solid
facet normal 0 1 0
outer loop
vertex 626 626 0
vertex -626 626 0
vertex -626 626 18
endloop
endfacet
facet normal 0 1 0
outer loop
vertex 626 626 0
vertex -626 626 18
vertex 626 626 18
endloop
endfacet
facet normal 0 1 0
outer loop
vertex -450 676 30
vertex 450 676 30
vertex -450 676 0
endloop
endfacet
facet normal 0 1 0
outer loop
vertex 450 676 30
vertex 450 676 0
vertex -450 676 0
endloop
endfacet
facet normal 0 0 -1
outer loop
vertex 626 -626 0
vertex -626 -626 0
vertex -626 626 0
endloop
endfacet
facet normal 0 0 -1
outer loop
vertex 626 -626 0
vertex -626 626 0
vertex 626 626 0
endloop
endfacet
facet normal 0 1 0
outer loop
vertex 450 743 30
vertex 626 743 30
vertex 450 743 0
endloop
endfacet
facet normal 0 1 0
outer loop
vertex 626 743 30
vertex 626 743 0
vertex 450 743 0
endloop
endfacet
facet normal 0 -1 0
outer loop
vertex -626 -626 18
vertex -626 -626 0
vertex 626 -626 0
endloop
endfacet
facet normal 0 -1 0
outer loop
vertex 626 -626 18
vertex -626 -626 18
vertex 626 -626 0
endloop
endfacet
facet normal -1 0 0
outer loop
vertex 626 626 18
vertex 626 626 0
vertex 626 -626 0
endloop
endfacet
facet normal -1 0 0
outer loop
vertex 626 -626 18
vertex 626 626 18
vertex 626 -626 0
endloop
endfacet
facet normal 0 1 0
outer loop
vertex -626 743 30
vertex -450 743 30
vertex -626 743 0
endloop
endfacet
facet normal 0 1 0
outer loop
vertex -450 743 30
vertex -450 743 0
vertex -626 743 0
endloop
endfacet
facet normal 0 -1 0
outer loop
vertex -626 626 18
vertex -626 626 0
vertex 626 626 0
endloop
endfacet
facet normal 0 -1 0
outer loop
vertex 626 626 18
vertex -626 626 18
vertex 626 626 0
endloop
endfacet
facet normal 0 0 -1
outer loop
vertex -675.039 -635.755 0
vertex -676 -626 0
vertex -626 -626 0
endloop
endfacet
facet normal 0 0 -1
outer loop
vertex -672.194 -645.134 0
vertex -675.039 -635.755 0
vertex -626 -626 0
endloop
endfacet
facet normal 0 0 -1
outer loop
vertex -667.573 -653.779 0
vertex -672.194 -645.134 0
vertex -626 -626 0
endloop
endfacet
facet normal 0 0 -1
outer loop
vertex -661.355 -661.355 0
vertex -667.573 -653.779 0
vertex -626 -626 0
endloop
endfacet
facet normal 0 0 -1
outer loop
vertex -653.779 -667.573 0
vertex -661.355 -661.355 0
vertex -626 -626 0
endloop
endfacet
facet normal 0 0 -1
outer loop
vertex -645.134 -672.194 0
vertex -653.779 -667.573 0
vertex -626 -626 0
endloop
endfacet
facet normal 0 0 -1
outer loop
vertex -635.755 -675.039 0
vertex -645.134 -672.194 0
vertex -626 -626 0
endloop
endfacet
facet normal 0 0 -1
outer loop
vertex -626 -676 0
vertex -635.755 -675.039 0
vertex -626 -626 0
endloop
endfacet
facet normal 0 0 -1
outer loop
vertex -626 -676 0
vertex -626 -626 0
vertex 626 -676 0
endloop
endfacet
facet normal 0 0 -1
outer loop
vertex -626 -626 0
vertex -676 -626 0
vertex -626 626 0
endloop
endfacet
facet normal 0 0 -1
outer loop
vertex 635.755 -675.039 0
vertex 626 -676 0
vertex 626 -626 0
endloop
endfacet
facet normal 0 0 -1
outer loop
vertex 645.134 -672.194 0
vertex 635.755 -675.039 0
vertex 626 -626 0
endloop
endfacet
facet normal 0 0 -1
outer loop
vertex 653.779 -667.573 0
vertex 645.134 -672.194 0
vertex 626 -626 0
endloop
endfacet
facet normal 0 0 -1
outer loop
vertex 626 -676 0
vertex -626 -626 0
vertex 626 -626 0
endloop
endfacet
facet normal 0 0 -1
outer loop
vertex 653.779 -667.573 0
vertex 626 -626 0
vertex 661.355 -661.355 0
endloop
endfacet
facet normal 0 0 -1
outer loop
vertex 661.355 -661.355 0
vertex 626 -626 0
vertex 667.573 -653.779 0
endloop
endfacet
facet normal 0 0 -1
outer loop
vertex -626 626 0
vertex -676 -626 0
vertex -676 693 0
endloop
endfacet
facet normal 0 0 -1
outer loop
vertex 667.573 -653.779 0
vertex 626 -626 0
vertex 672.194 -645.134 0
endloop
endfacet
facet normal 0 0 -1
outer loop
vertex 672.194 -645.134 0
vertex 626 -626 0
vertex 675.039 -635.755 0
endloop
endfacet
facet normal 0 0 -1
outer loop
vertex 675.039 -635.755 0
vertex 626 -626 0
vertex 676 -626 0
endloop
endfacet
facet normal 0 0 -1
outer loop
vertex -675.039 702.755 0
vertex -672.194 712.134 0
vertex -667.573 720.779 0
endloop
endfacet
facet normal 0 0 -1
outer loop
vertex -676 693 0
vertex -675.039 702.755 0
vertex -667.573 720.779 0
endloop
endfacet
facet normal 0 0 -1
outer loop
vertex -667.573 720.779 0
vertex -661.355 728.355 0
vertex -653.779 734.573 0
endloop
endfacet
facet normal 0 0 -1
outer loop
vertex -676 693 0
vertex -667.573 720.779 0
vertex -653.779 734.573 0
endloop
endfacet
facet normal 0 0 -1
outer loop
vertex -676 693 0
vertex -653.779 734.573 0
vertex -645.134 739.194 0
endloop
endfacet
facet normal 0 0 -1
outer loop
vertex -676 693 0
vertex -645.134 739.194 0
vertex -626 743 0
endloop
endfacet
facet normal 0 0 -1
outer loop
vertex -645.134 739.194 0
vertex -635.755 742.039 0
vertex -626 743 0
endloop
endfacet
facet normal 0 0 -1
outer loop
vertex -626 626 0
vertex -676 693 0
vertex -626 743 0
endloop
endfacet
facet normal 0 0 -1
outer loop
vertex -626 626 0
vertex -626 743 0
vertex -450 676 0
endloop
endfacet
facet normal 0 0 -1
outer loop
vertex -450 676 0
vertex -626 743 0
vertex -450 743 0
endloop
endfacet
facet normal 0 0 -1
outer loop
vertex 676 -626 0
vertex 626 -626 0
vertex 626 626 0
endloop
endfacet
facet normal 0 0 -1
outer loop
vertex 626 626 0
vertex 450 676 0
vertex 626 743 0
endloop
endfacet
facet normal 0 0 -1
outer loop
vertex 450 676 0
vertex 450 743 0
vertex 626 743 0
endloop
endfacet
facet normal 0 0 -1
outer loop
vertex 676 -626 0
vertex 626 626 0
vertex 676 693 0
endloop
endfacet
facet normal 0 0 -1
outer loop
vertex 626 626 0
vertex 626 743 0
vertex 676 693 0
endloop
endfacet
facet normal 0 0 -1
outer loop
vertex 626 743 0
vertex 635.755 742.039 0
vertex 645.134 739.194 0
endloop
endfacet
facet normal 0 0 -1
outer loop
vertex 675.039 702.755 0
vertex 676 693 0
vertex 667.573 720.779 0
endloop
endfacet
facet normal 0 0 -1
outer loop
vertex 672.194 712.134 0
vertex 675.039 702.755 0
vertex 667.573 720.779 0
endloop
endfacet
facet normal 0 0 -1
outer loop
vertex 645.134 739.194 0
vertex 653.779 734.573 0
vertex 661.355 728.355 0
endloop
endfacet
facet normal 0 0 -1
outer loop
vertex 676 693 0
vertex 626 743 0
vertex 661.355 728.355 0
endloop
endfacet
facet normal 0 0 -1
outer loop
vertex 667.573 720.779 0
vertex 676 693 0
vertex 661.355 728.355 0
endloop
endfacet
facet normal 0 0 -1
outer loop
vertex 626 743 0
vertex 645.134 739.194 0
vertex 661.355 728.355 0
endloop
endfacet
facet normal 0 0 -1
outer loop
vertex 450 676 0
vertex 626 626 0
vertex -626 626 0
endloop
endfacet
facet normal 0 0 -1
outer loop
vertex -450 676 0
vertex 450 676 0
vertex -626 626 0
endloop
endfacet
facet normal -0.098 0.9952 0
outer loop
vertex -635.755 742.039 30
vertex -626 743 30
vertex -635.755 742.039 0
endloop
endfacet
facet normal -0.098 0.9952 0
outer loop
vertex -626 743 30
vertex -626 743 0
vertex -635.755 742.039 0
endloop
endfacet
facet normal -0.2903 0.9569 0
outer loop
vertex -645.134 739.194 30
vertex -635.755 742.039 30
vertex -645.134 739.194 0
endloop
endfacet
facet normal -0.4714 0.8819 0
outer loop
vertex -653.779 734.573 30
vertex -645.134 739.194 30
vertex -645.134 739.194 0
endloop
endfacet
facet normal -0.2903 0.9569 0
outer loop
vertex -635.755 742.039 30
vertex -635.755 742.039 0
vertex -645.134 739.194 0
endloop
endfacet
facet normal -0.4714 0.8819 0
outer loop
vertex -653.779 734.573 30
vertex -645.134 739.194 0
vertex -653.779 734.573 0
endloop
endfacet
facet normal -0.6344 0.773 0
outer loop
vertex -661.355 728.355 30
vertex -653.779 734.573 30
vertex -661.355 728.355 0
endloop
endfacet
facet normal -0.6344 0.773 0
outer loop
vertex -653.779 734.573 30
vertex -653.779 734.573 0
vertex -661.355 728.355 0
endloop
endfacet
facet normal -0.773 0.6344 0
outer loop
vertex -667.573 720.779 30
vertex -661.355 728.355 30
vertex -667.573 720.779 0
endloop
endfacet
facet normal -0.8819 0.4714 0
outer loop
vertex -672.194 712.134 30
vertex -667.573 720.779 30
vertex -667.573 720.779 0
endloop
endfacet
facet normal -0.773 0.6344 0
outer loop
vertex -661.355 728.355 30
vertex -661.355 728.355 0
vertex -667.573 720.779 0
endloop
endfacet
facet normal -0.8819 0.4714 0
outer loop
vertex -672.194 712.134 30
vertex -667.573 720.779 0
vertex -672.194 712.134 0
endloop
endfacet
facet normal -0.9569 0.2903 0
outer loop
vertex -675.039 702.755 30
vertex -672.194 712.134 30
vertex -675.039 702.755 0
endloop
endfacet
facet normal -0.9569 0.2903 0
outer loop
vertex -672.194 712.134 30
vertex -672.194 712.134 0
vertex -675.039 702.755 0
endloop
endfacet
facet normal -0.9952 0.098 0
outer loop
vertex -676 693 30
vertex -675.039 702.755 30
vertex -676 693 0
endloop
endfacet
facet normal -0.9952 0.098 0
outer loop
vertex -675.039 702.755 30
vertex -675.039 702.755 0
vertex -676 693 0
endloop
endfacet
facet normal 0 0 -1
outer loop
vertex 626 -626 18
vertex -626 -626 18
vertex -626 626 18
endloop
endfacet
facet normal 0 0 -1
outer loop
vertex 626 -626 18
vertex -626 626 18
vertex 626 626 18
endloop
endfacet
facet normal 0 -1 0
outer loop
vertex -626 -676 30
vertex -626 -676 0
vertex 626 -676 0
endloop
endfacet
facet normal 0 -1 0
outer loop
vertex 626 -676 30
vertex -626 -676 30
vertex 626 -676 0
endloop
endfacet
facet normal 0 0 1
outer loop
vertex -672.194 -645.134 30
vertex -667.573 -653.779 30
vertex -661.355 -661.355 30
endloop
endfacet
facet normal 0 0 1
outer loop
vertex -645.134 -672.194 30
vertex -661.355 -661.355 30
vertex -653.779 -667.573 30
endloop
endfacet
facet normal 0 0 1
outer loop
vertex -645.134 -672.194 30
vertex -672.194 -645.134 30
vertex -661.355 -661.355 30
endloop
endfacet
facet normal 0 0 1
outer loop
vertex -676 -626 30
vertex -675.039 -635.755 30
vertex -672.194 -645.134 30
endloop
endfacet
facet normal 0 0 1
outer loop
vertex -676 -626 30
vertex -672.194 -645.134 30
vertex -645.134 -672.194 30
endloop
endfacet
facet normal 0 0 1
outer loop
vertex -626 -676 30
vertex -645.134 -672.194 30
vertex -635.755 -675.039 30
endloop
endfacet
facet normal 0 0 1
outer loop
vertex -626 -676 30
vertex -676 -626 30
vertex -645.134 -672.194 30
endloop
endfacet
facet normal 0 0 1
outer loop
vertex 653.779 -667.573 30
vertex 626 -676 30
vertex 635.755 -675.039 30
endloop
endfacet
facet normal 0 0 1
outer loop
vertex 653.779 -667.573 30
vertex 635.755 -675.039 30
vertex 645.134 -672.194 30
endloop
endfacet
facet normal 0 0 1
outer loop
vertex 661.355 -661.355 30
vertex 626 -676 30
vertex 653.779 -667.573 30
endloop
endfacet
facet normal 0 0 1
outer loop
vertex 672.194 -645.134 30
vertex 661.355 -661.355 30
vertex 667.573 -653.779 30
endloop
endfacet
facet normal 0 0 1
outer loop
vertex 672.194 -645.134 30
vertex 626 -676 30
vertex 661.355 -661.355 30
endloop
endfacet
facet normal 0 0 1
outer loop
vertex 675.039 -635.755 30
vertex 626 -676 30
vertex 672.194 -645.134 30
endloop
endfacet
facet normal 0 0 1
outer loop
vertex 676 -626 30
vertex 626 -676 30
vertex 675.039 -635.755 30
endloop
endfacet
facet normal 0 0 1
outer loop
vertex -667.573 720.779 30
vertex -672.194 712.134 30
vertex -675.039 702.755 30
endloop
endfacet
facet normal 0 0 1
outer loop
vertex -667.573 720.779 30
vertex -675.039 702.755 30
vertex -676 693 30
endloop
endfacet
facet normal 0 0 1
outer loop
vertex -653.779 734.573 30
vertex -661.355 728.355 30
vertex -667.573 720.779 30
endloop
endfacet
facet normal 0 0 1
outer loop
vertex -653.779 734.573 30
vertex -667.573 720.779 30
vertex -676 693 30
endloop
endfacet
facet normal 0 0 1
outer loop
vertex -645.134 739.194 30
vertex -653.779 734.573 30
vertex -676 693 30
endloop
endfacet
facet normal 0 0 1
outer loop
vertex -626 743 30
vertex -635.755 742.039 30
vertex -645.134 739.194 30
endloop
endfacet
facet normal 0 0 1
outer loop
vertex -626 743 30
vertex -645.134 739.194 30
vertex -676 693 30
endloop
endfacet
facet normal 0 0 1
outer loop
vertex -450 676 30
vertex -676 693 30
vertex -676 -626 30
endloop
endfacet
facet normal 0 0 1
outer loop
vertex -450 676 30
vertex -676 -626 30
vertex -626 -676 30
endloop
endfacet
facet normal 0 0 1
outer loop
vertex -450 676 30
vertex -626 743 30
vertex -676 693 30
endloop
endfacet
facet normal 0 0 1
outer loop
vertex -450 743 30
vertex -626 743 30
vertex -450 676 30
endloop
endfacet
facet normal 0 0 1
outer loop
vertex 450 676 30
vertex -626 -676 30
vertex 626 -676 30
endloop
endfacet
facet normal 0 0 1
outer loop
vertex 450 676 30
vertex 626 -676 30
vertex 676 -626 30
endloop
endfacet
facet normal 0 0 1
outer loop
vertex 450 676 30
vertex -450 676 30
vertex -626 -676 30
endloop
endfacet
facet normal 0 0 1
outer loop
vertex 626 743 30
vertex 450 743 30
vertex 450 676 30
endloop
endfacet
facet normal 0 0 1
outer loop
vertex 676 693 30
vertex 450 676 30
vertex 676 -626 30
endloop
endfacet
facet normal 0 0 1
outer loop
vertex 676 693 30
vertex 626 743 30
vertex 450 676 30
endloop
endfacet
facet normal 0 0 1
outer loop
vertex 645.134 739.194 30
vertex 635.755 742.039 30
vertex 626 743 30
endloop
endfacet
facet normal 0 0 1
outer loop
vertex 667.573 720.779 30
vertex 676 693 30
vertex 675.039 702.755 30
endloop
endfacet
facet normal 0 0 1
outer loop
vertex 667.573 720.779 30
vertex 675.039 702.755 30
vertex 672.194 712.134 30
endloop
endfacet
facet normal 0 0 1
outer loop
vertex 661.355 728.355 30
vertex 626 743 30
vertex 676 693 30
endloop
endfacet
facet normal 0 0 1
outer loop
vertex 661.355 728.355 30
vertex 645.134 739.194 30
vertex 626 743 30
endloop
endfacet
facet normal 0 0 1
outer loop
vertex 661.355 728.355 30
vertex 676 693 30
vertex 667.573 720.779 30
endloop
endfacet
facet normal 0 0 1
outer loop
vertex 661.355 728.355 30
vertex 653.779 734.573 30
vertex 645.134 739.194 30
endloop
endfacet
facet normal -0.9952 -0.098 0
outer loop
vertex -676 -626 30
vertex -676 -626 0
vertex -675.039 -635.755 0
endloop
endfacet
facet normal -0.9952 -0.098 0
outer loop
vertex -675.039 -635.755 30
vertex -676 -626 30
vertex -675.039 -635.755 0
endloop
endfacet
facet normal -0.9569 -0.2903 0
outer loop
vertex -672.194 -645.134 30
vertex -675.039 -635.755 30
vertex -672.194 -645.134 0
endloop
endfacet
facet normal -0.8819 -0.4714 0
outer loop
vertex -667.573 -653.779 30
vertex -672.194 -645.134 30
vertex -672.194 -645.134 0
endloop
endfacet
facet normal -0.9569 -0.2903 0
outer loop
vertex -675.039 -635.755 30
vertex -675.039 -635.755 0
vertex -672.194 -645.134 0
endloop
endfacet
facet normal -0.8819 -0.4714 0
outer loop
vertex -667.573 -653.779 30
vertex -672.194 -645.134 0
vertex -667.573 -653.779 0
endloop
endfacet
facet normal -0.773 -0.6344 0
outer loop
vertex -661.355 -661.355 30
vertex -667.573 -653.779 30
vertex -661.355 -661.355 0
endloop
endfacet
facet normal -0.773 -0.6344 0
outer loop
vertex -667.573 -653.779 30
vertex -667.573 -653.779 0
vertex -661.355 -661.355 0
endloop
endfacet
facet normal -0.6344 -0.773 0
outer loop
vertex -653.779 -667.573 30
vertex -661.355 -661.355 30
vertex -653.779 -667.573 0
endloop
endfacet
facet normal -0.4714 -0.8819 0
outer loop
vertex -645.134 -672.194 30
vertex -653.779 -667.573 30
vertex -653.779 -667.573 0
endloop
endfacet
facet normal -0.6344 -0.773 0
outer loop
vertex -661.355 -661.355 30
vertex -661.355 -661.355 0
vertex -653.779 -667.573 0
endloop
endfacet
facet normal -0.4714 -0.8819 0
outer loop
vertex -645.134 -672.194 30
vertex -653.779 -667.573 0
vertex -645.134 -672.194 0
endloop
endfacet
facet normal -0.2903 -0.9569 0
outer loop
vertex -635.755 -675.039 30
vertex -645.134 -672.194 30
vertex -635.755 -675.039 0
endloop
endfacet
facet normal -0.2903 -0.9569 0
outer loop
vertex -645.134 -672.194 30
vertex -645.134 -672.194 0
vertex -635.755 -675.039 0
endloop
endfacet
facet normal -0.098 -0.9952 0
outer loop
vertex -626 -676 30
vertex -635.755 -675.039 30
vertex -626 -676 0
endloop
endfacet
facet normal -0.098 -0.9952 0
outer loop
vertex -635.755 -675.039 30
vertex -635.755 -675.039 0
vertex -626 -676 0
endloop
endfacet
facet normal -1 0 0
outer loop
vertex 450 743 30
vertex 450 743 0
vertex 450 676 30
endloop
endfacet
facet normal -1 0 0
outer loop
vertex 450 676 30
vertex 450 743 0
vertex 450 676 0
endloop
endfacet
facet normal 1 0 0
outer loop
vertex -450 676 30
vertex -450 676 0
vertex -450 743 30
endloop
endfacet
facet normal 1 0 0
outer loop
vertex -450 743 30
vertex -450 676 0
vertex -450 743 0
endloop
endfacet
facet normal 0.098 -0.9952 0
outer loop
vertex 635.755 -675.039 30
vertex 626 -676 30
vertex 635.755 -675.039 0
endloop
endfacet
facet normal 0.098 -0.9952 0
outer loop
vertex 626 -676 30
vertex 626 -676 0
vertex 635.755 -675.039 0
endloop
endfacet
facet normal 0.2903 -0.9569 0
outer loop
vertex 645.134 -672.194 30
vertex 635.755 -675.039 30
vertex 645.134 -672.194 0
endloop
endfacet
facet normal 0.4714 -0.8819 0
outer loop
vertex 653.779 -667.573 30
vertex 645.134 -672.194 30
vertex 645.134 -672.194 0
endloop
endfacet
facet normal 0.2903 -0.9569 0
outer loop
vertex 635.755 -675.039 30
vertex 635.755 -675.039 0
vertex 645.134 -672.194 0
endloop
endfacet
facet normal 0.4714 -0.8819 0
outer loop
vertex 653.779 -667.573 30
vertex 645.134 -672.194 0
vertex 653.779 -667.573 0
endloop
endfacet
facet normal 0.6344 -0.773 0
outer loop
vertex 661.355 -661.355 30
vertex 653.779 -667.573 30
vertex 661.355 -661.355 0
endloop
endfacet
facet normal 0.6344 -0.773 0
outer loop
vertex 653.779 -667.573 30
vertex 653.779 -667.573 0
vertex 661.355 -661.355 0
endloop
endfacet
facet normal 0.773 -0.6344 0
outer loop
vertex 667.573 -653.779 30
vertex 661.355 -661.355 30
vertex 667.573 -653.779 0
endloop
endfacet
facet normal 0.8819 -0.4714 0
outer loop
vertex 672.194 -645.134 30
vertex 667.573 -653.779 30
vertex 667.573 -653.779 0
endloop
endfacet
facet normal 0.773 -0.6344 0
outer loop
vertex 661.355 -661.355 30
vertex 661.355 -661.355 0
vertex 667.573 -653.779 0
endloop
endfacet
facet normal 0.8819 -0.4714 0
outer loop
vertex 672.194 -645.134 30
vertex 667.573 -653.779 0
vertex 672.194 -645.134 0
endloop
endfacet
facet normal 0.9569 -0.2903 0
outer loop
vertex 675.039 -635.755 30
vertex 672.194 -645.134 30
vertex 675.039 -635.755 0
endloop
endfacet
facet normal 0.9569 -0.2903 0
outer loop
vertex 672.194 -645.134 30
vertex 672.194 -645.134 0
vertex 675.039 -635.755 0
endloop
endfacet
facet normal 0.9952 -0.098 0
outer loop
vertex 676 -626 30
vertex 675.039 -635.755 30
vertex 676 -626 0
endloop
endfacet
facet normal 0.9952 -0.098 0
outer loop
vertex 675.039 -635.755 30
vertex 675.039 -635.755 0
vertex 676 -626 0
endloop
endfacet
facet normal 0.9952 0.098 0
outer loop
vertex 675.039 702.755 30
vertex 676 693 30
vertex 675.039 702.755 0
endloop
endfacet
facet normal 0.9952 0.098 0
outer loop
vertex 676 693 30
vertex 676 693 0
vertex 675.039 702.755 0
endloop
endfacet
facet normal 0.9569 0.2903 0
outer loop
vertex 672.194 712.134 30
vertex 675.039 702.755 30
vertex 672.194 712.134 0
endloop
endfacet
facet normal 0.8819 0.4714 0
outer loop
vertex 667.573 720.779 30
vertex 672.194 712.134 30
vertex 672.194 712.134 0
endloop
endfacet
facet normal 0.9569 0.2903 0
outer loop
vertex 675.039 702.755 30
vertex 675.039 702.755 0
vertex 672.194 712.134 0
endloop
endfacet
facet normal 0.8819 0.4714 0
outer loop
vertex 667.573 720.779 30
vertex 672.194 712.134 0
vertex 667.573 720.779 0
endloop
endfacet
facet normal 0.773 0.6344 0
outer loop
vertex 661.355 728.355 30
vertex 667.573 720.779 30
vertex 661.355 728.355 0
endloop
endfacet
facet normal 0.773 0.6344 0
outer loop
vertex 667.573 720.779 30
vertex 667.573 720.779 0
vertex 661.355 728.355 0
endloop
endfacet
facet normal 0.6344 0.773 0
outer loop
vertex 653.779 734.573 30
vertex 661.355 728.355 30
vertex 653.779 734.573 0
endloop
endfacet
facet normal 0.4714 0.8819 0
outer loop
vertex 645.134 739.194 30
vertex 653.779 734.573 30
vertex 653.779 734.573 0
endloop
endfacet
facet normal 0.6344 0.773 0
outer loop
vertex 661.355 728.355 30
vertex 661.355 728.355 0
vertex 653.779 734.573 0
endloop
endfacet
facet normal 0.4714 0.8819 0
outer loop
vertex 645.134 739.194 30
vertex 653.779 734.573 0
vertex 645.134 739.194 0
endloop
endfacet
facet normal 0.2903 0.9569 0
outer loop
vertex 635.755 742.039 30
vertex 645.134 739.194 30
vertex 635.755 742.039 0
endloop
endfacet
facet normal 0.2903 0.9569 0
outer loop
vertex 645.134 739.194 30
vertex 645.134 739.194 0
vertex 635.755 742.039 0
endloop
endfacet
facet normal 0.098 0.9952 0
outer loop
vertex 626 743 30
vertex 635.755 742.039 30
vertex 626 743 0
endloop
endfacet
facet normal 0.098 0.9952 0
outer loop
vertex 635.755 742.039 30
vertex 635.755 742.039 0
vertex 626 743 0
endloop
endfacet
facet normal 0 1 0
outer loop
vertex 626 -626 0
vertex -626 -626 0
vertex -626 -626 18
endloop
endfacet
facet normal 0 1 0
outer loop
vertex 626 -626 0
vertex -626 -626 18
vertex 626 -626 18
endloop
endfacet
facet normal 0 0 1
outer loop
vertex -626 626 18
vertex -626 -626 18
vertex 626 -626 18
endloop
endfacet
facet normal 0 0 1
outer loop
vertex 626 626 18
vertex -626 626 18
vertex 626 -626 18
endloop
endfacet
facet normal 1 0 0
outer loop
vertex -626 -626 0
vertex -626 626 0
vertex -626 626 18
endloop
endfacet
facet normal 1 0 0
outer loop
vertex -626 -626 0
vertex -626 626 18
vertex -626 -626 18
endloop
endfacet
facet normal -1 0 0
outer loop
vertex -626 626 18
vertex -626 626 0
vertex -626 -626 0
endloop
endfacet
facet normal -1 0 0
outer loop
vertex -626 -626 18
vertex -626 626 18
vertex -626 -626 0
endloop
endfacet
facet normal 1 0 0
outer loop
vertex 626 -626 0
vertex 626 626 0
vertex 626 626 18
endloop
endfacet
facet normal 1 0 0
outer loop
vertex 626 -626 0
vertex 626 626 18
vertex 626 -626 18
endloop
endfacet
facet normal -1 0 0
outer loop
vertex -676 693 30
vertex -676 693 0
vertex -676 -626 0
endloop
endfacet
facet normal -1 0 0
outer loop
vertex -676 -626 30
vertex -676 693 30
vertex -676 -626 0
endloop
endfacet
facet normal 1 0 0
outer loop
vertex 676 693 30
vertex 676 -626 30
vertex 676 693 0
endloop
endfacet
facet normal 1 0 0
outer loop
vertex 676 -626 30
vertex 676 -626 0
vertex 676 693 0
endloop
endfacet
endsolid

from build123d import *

# Parameters (mm, degrees)
F1_DEPTH = 18
F2_DEPTH = 12
F3_W     = 1252
F3_H     = 1252
F4_DEPTH = 18


with BuildPart() as f1:
    # F0 (on Top) → F1 (new body)
    with BuildSketch(Plane.XY):
        with BuildLine():
            Line((-626, -676), (626, -676))
            ThreePointArc((626, -676), (661.3553390593, -661.3553390593), (676, -626))
            Line((676, -626), (676, 626))
            Line((676, 626), (676, 693))
            ThreePointArc((676, 693), (661.3553390593, 728.3553390593), (626, 743))
            Line((626, 743), (450, 743))
            Line((450, 743), (450, 676))
            Line((450, 676), (-450, 676))
            Line((-450, 676), (-450, 743))
            Line((-450, 743), (-626, 743))
            ThreePointArc((-626, 743), (-661.3553390593, 728.3553390593), (-676, 693))
            Line((-676, 693), (-676, 626))
            Line((-676, 626), (-676, -626))
            ThreePointArc((-676, -626), (-661.3553390593, -661.3553390593), (-626, -676))
        make_face()
    extrude(amount=F1_DEPTH)

    # F2 (add): a face of the model
    f2_faces = [f1.faces().sort_by_distance(p)[0] for p in [
        (0, 11.5377812553, 18),
    ]]
    extrude(f2_faces, amount=F2_DEPTH)


with BuildPart() as f4:
    # F3 (on face) → F4 (new body)
    with BuildSketch(Plane(origin=(0, 0, 0), x_dir=(1, 0, 0), z_dir=(0, 0, -1))):
        Rectangle(F3_W, F3_H)
    extrude(amount=-F4_DEPTH)


with BuildPart() as f1_1:
    add(f1.part)

    # F5: cut F4
    add(f4.part, mode=Mode.SUBTRACT)


solid = Compound([f4.part, f1_1.part])
